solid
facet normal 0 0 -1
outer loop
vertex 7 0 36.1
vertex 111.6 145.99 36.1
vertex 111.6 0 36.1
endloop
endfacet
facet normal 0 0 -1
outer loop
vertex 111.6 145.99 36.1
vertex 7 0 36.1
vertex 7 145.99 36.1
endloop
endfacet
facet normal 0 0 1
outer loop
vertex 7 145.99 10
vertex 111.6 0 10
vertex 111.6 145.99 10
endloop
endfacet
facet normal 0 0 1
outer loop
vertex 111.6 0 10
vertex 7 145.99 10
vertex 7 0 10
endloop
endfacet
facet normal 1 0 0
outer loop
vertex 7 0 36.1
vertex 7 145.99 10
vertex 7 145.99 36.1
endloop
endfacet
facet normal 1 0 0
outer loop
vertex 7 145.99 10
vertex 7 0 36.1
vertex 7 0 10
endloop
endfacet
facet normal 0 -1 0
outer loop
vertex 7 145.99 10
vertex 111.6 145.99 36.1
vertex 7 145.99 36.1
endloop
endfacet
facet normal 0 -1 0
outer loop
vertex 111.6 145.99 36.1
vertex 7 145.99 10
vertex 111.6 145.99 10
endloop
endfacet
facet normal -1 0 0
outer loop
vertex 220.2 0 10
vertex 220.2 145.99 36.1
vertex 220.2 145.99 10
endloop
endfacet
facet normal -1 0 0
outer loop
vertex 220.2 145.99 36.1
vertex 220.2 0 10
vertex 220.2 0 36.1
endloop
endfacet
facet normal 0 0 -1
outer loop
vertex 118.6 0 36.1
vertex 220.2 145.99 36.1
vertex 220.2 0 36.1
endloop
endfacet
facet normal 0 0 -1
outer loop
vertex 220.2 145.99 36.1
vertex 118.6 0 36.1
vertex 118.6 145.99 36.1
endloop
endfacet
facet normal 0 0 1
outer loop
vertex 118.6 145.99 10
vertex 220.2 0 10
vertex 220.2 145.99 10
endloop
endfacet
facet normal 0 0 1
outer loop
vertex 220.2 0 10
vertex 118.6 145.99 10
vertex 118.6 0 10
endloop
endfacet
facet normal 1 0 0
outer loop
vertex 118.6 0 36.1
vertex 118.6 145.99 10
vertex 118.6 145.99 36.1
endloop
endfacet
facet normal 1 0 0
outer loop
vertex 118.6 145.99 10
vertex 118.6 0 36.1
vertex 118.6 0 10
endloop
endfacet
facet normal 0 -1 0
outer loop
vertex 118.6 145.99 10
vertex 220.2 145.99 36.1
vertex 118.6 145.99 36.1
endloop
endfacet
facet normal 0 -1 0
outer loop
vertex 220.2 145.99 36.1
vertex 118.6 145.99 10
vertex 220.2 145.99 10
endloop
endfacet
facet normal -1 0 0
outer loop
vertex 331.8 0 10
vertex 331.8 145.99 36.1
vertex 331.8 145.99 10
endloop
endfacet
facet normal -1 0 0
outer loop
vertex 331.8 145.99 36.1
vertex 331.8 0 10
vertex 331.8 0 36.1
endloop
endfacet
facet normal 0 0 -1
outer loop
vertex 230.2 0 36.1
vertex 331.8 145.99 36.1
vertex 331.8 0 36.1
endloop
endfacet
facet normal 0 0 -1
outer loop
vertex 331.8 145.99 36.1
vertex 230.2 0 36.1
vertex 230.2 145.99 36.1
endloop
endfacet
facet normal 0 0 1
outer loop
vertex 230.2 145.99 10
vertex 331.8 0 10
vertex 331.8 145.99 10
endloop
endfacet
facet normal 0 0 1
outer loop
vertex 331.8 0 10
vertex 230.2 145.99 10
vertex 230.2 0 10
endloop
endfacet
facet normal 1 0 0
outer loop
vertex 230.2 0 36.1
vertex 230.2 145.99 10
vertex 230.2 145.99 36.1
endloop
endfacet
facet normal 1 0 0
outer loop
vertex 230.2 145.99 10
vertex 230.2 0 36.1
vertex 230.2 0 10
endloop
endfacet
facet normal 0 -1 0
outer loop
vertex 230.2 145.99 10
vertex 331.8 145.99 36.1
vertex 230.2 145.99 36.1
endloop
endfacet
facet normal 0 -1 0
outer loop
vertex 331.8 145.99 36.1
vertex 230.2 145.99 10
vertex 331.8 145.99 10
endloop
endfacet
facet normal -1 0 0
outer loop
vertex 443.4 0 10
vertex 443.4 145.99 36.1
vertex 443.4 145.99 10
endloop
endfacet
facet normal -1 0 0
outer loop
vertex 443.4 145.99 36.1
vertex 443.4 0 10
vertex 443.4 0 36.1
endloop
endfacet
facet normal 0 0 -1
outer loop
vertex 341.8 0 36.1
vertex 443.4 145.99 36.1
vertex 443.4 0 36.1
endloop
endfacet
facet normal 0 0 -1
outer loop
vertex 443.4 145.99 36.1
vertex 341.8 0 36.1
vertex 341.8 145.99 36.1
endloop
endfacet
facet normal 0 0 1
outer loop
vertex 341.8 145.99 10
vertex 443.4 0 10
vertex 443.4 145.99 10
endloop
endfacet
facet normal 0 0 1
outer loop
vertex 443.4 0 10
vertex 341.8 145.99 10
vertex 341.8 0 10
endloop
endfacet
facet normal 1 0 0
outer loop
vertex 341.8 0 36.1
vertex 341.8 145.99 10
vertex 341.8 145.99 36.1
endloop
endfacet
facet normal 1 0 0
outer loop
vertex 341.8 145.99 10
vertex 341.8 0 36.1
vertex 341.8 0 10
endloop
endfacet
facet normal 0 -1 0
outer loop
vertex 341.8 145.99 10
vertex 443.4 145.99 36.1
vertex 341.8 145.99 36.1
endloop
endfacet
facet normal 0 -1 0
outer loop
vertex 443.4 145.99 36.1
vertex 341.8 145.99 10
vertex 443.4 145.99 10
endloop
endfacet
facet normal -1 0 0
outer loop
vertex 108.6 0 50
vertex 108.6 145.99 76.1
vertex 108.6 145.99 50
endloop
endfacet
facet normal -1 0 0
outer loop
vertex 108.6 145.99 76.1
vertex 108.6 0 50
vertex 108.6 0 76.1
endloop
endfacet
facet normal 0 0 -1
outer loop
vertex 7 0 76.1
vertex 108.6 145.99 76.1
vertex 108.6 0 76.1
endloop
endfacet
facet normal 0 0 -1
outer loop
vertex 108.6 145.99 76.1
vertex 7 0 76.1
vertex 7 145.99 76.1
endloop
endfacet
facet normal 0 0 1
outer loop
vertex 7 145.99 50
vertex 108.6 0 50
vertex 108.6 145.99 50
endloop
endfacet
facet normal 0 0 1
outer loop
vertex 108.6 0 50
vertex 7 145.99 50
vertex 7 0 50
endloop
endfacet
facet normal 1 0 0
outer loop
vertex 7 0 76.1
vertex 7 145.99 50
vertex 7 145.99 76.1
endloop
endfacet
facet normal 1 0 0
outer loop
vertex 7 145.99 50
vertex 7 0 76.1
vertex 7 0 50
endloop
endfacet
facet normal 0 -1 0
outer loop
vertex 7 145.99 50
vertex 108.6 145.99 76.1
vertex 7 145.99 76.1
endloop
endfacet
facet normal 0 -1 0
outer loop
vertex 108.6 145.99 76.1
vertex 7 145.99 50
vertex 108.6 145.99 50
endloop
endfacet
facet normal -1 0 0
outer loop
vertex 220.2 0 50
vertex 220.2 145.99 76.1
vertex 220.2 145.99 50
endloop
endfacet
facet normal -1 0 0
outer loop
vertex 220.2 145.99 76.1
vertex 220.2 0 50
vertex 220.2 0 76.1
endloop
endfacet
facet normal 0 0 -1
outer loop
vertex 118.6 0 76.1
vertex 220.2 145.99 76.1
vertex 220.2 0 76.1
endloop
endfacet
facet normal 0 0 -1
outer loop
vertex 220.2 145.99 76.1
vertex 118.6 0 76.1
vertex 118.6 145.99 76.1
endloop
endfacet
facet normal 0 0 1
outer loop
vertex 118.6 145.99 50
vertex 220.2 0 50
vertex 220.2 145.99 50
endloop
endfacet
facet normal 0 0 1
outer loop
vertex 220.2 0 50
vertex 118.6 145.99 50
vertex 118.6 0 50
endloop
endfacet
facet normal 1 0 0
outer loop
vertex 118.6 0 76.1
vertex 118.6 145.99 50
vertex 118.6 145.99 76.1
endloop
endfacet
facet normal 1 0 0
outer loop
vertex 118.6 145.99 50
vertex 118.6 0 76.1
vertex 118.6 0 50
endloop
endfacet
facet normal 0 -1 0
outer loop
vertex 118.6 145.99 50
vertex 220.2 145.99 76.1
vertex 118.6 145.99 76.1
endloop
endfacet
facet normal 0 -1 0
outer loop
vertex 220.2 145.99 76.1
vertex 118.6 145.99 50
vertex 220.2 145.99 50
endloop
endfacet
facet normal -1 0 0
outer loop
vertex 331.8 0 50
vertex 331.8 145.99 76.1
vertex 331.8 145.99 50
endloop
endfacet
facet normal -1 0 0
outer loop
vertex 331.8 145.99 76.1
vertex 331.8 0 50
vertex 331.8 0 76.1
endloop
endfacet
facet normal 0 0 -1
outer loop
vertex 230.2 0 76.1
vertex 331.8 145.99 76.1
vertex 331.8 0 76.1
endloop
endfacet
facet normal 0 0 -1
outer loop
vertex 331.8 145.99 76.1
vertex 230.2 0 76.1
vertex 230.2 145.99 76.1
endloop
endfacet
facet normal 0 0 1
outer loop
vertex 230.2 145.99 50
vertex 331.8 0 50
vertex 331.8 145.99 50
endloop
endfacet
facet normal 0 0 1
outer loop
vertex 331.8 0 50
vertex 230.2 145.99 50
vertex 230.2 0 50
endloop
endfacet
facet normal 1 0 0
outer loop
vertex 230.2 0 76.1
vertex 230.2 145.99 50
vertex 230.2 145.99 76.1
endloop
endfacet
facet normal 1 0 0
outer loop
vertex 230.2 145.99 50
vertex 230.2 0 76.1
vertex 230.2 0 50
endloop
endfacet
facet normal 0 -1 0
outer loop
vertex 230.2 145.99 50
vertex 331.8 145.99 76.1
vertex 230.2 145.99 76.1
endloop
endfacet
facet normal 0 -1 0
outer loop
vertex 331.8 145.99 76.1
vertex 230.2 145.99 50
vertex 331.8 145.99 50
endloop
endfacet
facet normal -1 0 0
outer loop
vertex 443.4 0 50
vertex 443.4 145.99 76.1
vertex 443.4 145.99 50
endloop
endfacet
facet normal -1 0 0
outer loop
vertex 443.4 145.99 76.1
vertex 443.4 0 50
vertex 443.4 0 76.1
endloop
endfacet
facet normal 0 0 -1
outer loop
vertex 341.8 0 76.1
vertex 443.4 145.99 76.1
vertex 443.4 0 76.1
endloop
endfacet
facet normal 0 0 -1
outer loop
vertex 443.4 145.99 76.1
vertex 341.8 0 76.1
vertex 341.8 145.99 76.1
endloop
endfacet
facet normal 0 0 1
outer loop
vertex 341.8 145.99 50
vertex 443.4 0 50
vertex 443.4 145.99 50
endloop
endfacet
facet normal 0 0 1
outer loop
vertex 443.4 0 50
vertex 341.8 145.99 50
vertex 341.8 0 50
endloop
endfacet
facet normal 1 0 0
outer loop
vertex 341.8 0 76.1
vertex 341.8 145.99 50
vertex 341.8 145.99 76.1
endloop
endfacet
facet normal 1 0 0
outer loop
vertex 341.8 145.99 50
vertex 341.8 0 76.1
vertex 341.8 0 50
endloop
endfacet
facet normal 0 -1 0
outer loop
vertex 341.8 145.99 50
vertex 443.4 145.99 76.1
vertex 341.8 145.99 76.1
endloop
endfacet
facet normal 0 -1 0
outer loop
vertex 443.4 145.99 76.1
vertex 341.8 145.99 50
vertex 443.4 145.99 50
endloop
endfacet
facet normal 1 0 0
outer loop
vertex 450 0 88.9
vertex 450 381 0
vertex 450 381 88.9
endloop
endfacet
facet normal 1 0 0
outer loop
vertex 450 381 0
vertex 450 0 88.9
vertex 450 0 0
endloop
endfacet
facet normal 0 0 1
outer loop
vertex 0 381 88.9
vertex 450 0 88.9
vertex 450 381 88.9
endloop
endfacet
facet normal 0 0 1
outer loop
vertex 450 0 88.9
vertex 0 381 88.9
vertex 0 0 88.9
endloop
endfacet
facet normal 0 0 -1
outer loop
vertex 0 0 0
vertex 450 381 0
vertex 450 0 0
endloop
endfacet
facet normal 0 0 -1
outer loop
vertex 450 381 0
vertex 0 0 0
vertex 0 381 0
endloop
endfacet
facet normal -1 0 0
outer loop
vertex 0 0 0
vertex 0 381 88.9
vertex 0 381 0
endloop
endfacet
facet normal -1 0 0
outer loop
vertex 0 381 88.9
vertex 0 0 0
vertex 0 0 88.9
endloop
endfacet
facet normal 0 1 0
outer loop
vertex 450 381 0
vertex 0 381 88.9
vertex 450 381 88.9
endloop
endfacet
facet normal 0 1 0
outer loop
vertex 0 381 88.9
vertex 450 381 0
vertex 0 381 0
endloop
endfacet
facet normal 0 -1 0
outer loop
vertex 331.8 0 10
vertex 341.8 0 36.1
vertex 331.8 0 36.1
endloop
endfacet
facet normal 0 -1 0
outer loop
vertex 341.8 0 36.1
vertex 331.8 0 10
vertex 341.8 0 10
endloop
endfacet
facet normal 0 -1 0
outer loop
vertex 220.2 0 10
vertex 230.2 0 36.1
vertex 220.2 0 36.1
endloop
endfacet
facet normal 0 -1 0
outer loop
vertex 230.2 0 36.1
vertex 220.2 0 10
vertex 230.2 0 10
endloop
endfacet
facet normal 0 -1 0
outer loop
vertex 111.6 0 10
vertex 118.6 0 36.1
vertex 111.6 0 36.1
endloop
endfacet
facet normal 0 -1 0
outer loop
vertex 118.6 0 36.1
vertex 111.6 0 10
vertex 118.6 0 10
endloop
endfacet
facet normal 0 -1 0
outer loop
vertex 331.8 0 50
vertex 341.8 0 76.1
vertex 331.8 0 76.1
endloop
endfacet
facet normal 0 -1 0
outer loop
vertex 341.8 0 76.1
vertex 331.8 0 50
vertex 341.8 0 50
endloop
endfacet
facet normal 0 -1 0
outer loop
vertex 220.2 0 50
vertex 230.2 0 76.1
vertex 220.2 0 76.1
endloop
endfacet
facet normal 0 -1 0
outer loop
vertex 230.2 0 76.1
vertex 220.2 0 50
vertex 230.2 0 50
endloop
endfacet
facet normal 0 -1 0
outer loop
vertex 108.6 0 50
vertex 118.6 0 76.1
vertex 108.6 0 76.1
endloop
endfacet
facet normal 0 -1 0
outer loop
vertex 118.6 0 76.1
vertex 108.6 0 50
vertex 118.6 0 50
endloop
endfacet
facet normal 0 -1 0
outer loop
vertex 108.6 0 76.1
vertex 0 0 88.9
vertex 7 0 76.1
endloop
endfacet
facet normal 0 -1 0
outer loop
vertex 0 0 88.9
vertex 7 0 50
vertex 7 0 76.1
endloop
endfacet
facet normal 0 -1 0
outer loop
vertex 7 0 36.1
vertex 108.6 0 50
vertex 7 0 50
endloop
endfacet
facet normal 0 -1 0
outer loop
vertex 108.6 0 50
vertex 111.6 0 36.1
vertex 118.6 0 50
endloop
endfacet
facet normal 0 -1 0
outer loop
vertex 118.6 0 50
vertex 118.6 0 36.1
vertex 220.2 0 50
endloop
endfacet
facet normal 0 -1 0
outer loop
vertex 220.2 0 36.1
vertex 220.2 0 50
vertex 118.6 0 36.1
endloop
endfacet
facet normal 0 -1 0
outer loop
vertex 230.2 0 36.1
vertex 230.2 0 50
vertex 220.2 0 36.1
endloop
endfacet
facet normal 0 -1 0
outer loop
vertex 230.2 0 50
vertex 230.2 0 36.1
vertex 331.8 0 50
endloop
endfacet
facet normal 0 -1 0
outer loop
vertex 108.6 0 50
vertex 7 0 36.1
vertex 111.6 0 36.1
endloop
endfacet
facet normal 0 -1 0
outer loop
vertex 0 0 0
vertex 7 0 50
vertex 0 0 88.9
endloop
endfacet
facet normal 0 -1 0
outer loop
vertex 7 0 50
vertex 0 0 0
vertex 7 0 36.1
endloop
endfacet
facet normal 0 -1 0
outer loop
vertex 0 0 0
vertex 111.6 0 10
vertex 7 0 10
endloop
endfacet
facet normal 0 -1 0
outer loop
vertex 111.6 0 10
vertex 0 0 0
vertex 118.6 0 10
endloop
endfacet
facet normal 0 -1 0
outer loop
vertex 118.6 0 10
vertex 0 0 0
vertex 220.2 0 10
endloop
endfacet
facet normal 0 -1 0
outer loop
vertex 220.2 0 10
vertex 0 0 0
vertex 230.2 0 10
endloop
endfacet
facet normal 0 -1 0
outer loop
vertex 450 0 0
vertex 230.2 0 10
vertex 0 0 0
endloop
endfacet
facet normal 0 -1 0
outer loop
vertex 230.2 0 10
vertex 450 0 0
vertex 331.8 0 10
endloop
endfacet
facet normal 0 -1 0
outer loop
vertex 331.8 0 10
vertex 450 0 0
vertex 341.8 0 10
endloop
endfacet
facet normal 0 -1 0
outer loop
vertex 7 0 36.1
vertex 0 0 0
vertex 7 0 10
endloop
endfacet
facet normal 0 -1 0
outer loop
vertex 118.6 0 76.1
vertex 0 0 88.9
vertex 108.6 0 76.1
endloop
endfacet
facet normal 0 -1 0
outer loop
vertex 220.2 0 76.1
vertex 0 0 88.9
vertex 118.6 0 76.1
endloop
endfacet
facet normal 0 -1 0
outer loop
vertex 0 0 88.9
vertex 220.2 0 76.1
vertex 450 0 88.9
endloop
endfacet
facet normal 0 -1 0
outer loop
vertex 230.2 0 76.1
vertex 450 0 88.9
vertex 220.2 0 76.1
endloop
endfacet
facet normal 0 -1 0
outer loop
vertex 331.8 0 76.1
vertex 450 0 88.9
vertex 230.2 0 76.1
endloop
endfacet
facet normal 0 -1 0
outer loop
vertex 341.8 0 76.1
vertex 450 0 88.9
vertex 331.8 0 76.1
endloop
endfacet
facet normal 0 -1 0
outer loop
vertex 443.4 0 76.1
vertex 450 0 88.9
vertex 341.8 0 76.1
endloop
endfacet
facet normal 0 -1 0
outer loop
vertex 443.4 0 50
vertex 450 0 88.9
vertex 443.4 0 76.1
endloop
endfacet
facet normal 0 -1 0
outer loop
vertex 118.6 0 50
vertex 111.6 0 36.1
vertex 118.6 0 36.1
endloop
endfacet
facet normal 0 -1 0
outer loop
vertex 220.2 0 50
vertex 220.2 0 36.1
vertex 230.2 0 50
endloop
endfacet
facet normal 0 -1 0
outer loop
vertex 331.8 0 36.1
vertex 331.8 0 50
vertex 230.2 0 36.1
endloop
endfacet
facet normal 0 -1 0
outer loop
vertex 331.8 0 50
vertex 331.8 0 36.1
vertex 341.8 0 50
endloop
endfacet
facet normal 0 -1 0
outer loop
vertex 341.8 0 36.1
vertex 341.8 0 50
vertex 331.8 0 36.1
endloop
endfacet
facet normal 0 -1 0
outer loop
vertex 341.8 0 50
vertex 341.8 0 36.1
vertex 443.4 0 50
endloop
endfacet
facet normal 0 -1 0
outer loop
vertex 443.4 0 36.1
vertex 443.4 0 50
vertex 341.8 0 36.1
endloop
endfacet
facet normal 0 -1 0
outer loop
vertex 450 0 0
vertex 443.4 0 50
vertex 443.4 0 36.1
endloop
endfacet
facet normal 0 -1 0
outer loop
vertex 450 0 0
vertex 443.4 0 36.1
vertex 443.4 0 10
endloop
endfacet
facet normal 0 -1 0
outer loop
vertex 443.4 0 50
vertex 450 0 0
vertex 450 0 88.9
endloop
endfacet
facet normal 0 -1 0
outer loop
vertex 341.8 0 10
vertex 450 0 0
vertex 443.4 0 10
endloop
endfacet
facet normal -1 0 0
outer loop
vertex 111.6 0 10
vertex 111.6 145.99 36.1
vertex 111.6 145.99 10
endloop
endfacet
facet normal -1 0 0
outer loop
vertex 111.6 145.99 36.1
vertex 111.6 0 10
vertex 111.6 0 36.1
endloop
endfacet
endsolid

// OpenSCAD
sys_width = 450;
screw_width = 465;

unit_height = 44.45;

sys_height = unit_height * 2;

sys_depth = 381;

big_hdd_width = 101.6;
big_hdd_depth = 146;
big_hdd_height = 26.1;

difference(){
    cube([sys_width, sys_depth, sys_height]);

    // first slot
    translate([10, -0.01, 10]){
        cube([big_hdd_width, big_hdd_depth, big_hdd_height]);
    }
    
    for(x = [7:10+big_hdd_width:450]){
        translate([x, -0.01, 10]){
        cube([big_hdd_width, big_hdd_depth, big_hdd_height]);
    }
    }
    
    for(x = [7:10+big_hdd_width:450]){
        translate([x, -0.01, 50]){
        cube([big_hdd_width, big_hdd_depth, big_hdd_height]);
    }
    }
}
